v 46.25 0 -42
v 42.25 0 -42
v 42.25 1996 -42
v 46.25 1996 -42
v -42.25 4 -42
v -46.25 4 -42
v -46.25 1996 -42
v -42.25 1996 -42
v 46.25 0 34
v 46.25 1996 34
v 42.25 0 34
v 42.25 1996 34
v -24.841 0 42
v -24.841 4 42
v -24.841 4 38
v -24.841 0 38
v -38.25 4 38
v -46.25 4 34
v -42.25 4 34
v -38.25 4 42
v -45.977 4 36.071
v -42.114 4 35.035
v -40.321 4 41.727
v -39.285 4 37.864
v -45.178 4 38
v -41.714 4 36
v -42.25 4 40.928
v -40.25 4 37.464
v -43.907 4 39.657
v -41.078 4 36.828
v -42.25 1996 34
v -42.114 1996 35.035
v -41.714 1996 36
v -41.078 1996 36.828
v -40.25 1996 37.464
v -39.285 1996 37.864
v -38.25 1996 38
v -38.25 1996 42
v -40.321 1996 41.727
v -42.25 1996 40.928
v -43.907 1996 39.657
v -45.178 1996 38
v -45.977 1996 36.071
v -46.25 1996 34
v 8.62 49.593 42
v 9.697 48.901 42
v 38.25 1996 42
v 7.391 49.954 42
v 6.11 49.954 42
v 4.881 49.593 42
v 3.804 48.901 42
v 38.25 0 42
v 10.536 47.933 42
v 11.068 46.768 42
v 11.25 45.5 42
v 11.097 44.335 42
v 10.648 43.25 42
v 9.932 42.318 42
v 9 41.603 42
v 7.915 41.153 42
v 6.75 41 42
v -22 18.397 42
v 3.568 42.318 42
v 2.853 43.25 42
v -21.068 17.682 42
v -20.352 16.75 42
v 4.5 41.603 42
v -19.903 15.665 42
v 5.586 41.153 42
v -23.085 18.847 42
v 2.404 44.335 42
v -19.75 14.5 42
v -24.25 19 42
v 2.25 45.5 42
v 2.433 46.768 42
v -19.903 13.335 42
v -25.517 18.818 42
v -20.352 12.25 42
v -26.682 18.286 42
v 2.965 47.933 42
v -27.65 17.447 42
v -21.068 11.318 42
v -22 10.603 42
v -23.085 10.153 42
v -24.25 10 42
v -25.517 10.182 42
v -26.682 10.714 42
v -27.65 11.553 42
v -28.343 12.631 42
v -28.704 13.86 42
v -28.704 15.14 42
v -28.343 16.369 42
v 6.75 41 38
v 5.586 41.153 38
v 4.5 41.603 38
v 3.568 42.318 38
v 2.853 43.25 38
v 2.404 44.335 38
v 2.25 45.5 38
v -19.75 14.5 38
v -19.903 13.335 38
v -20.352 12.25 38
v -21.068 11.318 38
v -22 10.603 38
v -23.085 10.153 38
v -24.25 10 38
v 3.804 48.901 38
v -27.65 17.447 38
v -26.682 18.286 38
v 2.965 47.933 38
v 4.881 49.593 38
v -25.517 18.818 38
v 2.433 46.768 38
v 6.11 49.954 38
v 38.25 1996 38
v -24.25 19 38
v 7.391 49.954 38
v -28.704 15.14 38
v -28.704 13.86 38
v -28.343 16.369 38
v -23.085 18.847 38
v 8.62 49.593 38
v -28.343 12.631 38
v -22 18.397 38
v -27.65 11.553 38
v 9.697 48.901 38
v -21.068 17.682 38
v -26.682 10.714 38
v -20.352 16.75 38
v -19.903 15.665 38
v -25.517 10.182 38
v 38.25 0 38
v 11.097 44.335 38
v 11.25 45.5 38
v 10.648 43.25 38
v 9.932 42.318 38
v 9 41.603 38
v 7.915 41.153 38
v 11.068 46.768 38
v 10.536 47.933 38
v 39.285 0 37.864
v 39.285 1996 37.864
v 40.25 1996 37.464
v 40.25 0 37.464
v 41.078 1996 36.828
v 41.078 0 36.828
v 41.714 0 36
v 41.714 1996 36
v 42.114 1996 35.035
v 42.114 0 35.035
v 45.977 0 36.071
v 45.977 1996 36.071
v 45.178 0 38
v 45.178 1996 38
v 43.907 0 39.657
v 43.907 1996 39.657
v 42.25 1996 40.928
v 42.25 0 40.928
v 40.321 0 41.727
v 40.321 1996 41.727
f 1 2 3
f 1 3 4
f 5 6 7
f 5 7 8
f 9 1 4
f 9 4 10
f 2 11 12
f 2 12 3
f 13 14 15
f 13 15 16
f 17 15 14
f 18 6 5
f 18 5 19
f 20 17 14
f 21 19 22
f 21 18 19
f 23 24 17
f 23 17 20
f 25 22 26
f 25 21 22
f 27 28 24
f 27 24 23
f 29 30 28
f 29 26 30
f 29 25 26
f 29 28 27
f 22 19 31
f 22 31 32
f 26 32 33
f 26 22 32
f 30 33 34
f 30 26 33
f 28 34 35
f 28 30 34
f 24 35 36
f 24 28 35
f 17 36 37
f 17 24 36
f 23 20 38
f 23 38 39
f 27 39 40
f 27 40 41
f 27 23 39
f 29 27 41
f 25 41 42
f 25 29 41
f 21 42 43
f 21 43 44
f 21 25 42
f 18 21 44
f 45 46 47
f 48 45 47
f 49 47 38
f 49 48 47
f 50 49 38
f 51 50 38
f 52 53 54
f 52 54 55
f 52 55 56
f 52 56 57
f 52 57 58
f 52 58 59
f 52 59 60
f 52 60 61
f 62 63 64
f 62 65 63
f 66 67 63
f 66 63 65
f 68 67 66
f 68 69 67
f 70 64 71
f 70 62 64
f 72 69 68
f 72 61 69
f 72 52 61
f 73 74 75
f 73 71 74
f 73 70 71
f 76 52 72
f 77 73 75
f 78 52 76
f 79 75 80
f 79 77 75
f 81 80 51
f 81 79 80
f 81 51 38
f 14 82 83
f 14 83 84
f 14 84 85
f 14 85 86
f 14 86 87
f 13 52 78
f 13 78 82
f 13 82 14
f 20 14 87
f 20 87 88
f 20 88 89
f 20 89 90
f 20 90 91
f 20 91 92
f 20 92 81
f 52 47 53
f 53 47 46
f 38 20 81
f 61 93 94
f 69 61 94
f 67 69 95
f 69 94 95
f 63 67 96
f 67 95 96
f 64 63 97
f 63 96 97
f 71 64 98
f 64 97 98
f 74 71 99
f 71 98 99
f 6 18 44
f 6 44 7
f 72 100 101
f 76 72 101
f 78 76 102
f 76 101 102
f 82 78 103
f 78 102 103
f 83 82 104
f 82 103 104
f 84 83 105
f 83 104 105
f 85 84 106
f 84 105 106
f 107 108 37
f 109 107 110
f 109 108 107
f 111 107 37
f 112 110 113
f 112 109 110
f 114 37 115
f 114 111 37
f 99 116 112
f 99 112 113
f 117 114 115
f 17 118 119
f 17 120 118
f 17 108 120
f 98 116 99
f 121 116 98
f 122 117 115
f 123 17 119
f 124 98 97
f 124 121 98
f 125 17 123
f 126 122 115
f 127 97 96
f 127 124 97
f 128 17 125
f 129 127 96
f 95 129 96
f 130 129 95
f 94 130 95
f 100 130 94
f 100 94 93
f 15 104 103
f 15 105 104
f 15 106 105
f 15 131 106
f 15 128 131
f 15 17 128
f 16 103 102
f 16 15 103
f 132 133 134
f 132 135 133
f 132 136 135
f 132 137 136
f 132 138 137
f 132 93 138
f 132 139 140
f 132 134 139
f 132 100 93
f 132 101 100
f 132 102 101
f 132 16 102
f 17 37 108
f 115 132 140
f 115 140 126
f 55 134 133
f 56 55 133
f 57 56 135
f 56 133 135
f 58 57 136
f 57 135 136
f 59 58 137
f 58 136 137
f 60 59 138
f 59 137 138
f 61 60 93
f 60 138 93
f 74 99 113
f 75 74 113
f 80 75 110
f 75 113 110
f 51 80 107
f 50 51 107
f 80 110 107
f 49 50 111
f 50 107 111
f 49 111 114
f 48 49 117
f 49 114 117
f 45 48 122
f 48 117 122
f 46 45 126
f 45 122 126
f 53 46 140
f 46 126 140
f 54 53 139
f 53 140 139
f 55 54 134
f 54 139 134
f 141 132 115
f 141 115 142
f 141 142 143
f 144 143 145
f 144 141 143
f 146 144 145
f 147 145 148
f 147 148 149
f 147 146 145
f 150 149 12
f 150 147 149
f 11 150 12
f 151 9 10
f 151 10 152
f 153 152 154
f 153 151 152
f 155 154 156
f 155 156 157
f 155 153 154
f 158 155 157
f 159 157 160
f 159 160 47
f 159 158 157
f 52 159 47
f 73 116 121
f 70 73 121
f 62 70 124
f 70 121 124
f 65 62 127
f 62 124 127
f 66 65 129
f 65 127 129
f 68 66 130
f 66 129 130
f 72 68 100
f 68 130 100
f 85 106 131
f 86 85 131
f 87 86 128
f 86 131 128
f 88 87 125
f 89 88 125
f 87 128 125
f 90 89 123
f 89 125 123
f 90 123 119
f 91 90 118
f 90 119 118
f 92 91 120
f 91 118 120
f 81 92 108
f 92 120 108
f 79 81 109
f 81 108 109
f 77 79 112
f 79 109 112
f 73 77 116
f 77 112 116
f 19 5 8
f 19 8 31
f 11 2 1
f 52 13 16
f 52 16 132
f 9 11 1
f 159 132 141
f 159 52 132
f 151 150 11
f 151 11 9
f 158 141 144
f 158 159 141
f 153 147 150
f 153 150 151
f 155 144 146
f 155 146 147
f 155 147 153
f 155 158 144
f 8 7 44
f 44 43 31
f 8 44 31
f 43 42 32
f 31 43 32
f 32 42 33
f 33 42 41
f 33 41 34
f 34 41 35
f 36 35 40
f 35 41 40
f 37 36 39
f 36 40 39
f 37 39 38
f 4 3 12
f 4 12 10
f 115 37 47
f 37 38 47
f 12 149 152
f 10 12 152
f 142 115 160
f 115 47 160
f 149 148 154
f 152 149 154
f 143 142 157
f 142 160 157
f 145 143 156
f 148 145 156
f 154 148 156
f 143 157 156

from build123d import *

# Parameters (mm, degrees)
F1_DEPTH = 1996
F3_W     = 4
F3_H     = 87
F4_DEPTH = 21.409
F6_DEPTH = 4.001


with BuildPart() as f1:
    # F0 (on Front) → F1 (new body)
    with BuildSketch(Plane.XZ):
        with BuildLine():
            Line((-46.25, 34), (-46.25, -42))
            Line((-46.25, -42), (-42.25, -42))
            Line((-42.25, -42), (-42.25, 34))
            ThreePointArc((-42.25, 34), (-41.0784271247, 36.8284271247), (-38.25, 38))
            Line((-38.25, 38), (38.25, 38))
            ThreePointArc((38.25, 38), (41.0784271247, 36.8284271247), (42.25, 34))
            Line((42.25, 34), (42.25, -42))
            Line((42.25, -42), (46.25, -42))
            Line((46.25, -42), (46.25, 34))
            ThreePointArc((46.25, 34), (43.9068542495, 39.6568542495), (38.25, 42))
            Line((38.25, 42), (-38.25, 42))
            ThreePointArc((-38.25, 42), (-43.9068542495, 39.6568542495), (-46.25, 34))
        make_face()
    extrude(amount=-F1_DEPTH)

    # F3 (on face) → F4 (cut)
    with BuildSketch(Plane(origin=(-46.25, 0, 0), x_dir=(0, -1, 0), z_dir=(-1, 0, 0))):
        with Locations((-2, 0.3707238951)):
            Rectangle(F3_W, F3_H)
    extrude(amount=-F4_DEPTH, mode=Mode.SUBTRACT)

    # F5 (on face) → F6 (cut, through all)
    with BuildSketch(Plane(origin=(0, 0, 38), x_dir=(1, 0, 0), z_dir=(0, 0, -1))):
        with BuildLine():
            ThreePointArc((-19.7495876579, -14.5), (-21.0676071426, -11.3180194847), (-24.2495876579, -10))
            ThreePointArc((-24.2495876579, -10), (-28.7495876579, -14.5), (-24.2495876579, -19))
            ThreePointArc((-24.2495876579, -19), (-21.0676071426, -17.6819805153), (-19.7495876579, -14.5))
        make_face()
        with BuildLine():
            ThreePointArc((11.2504123421, -45.5), (9.9323928574, -42.3180194847), (6.7504123421, -41))
            ThreePointArc((6.7504123421, -41), (3.5684318267, -42.3180194847), (2.2504123421, -45.5))
            ThreePointArc((2.2504123421, -45.5), (6.7504123421, -50), (11.2504123421, -45.5))
        make_face()
    extrude(amount=-F6_DEPTH, mode=Mode.SUBTRACT)


solid = f1.part
